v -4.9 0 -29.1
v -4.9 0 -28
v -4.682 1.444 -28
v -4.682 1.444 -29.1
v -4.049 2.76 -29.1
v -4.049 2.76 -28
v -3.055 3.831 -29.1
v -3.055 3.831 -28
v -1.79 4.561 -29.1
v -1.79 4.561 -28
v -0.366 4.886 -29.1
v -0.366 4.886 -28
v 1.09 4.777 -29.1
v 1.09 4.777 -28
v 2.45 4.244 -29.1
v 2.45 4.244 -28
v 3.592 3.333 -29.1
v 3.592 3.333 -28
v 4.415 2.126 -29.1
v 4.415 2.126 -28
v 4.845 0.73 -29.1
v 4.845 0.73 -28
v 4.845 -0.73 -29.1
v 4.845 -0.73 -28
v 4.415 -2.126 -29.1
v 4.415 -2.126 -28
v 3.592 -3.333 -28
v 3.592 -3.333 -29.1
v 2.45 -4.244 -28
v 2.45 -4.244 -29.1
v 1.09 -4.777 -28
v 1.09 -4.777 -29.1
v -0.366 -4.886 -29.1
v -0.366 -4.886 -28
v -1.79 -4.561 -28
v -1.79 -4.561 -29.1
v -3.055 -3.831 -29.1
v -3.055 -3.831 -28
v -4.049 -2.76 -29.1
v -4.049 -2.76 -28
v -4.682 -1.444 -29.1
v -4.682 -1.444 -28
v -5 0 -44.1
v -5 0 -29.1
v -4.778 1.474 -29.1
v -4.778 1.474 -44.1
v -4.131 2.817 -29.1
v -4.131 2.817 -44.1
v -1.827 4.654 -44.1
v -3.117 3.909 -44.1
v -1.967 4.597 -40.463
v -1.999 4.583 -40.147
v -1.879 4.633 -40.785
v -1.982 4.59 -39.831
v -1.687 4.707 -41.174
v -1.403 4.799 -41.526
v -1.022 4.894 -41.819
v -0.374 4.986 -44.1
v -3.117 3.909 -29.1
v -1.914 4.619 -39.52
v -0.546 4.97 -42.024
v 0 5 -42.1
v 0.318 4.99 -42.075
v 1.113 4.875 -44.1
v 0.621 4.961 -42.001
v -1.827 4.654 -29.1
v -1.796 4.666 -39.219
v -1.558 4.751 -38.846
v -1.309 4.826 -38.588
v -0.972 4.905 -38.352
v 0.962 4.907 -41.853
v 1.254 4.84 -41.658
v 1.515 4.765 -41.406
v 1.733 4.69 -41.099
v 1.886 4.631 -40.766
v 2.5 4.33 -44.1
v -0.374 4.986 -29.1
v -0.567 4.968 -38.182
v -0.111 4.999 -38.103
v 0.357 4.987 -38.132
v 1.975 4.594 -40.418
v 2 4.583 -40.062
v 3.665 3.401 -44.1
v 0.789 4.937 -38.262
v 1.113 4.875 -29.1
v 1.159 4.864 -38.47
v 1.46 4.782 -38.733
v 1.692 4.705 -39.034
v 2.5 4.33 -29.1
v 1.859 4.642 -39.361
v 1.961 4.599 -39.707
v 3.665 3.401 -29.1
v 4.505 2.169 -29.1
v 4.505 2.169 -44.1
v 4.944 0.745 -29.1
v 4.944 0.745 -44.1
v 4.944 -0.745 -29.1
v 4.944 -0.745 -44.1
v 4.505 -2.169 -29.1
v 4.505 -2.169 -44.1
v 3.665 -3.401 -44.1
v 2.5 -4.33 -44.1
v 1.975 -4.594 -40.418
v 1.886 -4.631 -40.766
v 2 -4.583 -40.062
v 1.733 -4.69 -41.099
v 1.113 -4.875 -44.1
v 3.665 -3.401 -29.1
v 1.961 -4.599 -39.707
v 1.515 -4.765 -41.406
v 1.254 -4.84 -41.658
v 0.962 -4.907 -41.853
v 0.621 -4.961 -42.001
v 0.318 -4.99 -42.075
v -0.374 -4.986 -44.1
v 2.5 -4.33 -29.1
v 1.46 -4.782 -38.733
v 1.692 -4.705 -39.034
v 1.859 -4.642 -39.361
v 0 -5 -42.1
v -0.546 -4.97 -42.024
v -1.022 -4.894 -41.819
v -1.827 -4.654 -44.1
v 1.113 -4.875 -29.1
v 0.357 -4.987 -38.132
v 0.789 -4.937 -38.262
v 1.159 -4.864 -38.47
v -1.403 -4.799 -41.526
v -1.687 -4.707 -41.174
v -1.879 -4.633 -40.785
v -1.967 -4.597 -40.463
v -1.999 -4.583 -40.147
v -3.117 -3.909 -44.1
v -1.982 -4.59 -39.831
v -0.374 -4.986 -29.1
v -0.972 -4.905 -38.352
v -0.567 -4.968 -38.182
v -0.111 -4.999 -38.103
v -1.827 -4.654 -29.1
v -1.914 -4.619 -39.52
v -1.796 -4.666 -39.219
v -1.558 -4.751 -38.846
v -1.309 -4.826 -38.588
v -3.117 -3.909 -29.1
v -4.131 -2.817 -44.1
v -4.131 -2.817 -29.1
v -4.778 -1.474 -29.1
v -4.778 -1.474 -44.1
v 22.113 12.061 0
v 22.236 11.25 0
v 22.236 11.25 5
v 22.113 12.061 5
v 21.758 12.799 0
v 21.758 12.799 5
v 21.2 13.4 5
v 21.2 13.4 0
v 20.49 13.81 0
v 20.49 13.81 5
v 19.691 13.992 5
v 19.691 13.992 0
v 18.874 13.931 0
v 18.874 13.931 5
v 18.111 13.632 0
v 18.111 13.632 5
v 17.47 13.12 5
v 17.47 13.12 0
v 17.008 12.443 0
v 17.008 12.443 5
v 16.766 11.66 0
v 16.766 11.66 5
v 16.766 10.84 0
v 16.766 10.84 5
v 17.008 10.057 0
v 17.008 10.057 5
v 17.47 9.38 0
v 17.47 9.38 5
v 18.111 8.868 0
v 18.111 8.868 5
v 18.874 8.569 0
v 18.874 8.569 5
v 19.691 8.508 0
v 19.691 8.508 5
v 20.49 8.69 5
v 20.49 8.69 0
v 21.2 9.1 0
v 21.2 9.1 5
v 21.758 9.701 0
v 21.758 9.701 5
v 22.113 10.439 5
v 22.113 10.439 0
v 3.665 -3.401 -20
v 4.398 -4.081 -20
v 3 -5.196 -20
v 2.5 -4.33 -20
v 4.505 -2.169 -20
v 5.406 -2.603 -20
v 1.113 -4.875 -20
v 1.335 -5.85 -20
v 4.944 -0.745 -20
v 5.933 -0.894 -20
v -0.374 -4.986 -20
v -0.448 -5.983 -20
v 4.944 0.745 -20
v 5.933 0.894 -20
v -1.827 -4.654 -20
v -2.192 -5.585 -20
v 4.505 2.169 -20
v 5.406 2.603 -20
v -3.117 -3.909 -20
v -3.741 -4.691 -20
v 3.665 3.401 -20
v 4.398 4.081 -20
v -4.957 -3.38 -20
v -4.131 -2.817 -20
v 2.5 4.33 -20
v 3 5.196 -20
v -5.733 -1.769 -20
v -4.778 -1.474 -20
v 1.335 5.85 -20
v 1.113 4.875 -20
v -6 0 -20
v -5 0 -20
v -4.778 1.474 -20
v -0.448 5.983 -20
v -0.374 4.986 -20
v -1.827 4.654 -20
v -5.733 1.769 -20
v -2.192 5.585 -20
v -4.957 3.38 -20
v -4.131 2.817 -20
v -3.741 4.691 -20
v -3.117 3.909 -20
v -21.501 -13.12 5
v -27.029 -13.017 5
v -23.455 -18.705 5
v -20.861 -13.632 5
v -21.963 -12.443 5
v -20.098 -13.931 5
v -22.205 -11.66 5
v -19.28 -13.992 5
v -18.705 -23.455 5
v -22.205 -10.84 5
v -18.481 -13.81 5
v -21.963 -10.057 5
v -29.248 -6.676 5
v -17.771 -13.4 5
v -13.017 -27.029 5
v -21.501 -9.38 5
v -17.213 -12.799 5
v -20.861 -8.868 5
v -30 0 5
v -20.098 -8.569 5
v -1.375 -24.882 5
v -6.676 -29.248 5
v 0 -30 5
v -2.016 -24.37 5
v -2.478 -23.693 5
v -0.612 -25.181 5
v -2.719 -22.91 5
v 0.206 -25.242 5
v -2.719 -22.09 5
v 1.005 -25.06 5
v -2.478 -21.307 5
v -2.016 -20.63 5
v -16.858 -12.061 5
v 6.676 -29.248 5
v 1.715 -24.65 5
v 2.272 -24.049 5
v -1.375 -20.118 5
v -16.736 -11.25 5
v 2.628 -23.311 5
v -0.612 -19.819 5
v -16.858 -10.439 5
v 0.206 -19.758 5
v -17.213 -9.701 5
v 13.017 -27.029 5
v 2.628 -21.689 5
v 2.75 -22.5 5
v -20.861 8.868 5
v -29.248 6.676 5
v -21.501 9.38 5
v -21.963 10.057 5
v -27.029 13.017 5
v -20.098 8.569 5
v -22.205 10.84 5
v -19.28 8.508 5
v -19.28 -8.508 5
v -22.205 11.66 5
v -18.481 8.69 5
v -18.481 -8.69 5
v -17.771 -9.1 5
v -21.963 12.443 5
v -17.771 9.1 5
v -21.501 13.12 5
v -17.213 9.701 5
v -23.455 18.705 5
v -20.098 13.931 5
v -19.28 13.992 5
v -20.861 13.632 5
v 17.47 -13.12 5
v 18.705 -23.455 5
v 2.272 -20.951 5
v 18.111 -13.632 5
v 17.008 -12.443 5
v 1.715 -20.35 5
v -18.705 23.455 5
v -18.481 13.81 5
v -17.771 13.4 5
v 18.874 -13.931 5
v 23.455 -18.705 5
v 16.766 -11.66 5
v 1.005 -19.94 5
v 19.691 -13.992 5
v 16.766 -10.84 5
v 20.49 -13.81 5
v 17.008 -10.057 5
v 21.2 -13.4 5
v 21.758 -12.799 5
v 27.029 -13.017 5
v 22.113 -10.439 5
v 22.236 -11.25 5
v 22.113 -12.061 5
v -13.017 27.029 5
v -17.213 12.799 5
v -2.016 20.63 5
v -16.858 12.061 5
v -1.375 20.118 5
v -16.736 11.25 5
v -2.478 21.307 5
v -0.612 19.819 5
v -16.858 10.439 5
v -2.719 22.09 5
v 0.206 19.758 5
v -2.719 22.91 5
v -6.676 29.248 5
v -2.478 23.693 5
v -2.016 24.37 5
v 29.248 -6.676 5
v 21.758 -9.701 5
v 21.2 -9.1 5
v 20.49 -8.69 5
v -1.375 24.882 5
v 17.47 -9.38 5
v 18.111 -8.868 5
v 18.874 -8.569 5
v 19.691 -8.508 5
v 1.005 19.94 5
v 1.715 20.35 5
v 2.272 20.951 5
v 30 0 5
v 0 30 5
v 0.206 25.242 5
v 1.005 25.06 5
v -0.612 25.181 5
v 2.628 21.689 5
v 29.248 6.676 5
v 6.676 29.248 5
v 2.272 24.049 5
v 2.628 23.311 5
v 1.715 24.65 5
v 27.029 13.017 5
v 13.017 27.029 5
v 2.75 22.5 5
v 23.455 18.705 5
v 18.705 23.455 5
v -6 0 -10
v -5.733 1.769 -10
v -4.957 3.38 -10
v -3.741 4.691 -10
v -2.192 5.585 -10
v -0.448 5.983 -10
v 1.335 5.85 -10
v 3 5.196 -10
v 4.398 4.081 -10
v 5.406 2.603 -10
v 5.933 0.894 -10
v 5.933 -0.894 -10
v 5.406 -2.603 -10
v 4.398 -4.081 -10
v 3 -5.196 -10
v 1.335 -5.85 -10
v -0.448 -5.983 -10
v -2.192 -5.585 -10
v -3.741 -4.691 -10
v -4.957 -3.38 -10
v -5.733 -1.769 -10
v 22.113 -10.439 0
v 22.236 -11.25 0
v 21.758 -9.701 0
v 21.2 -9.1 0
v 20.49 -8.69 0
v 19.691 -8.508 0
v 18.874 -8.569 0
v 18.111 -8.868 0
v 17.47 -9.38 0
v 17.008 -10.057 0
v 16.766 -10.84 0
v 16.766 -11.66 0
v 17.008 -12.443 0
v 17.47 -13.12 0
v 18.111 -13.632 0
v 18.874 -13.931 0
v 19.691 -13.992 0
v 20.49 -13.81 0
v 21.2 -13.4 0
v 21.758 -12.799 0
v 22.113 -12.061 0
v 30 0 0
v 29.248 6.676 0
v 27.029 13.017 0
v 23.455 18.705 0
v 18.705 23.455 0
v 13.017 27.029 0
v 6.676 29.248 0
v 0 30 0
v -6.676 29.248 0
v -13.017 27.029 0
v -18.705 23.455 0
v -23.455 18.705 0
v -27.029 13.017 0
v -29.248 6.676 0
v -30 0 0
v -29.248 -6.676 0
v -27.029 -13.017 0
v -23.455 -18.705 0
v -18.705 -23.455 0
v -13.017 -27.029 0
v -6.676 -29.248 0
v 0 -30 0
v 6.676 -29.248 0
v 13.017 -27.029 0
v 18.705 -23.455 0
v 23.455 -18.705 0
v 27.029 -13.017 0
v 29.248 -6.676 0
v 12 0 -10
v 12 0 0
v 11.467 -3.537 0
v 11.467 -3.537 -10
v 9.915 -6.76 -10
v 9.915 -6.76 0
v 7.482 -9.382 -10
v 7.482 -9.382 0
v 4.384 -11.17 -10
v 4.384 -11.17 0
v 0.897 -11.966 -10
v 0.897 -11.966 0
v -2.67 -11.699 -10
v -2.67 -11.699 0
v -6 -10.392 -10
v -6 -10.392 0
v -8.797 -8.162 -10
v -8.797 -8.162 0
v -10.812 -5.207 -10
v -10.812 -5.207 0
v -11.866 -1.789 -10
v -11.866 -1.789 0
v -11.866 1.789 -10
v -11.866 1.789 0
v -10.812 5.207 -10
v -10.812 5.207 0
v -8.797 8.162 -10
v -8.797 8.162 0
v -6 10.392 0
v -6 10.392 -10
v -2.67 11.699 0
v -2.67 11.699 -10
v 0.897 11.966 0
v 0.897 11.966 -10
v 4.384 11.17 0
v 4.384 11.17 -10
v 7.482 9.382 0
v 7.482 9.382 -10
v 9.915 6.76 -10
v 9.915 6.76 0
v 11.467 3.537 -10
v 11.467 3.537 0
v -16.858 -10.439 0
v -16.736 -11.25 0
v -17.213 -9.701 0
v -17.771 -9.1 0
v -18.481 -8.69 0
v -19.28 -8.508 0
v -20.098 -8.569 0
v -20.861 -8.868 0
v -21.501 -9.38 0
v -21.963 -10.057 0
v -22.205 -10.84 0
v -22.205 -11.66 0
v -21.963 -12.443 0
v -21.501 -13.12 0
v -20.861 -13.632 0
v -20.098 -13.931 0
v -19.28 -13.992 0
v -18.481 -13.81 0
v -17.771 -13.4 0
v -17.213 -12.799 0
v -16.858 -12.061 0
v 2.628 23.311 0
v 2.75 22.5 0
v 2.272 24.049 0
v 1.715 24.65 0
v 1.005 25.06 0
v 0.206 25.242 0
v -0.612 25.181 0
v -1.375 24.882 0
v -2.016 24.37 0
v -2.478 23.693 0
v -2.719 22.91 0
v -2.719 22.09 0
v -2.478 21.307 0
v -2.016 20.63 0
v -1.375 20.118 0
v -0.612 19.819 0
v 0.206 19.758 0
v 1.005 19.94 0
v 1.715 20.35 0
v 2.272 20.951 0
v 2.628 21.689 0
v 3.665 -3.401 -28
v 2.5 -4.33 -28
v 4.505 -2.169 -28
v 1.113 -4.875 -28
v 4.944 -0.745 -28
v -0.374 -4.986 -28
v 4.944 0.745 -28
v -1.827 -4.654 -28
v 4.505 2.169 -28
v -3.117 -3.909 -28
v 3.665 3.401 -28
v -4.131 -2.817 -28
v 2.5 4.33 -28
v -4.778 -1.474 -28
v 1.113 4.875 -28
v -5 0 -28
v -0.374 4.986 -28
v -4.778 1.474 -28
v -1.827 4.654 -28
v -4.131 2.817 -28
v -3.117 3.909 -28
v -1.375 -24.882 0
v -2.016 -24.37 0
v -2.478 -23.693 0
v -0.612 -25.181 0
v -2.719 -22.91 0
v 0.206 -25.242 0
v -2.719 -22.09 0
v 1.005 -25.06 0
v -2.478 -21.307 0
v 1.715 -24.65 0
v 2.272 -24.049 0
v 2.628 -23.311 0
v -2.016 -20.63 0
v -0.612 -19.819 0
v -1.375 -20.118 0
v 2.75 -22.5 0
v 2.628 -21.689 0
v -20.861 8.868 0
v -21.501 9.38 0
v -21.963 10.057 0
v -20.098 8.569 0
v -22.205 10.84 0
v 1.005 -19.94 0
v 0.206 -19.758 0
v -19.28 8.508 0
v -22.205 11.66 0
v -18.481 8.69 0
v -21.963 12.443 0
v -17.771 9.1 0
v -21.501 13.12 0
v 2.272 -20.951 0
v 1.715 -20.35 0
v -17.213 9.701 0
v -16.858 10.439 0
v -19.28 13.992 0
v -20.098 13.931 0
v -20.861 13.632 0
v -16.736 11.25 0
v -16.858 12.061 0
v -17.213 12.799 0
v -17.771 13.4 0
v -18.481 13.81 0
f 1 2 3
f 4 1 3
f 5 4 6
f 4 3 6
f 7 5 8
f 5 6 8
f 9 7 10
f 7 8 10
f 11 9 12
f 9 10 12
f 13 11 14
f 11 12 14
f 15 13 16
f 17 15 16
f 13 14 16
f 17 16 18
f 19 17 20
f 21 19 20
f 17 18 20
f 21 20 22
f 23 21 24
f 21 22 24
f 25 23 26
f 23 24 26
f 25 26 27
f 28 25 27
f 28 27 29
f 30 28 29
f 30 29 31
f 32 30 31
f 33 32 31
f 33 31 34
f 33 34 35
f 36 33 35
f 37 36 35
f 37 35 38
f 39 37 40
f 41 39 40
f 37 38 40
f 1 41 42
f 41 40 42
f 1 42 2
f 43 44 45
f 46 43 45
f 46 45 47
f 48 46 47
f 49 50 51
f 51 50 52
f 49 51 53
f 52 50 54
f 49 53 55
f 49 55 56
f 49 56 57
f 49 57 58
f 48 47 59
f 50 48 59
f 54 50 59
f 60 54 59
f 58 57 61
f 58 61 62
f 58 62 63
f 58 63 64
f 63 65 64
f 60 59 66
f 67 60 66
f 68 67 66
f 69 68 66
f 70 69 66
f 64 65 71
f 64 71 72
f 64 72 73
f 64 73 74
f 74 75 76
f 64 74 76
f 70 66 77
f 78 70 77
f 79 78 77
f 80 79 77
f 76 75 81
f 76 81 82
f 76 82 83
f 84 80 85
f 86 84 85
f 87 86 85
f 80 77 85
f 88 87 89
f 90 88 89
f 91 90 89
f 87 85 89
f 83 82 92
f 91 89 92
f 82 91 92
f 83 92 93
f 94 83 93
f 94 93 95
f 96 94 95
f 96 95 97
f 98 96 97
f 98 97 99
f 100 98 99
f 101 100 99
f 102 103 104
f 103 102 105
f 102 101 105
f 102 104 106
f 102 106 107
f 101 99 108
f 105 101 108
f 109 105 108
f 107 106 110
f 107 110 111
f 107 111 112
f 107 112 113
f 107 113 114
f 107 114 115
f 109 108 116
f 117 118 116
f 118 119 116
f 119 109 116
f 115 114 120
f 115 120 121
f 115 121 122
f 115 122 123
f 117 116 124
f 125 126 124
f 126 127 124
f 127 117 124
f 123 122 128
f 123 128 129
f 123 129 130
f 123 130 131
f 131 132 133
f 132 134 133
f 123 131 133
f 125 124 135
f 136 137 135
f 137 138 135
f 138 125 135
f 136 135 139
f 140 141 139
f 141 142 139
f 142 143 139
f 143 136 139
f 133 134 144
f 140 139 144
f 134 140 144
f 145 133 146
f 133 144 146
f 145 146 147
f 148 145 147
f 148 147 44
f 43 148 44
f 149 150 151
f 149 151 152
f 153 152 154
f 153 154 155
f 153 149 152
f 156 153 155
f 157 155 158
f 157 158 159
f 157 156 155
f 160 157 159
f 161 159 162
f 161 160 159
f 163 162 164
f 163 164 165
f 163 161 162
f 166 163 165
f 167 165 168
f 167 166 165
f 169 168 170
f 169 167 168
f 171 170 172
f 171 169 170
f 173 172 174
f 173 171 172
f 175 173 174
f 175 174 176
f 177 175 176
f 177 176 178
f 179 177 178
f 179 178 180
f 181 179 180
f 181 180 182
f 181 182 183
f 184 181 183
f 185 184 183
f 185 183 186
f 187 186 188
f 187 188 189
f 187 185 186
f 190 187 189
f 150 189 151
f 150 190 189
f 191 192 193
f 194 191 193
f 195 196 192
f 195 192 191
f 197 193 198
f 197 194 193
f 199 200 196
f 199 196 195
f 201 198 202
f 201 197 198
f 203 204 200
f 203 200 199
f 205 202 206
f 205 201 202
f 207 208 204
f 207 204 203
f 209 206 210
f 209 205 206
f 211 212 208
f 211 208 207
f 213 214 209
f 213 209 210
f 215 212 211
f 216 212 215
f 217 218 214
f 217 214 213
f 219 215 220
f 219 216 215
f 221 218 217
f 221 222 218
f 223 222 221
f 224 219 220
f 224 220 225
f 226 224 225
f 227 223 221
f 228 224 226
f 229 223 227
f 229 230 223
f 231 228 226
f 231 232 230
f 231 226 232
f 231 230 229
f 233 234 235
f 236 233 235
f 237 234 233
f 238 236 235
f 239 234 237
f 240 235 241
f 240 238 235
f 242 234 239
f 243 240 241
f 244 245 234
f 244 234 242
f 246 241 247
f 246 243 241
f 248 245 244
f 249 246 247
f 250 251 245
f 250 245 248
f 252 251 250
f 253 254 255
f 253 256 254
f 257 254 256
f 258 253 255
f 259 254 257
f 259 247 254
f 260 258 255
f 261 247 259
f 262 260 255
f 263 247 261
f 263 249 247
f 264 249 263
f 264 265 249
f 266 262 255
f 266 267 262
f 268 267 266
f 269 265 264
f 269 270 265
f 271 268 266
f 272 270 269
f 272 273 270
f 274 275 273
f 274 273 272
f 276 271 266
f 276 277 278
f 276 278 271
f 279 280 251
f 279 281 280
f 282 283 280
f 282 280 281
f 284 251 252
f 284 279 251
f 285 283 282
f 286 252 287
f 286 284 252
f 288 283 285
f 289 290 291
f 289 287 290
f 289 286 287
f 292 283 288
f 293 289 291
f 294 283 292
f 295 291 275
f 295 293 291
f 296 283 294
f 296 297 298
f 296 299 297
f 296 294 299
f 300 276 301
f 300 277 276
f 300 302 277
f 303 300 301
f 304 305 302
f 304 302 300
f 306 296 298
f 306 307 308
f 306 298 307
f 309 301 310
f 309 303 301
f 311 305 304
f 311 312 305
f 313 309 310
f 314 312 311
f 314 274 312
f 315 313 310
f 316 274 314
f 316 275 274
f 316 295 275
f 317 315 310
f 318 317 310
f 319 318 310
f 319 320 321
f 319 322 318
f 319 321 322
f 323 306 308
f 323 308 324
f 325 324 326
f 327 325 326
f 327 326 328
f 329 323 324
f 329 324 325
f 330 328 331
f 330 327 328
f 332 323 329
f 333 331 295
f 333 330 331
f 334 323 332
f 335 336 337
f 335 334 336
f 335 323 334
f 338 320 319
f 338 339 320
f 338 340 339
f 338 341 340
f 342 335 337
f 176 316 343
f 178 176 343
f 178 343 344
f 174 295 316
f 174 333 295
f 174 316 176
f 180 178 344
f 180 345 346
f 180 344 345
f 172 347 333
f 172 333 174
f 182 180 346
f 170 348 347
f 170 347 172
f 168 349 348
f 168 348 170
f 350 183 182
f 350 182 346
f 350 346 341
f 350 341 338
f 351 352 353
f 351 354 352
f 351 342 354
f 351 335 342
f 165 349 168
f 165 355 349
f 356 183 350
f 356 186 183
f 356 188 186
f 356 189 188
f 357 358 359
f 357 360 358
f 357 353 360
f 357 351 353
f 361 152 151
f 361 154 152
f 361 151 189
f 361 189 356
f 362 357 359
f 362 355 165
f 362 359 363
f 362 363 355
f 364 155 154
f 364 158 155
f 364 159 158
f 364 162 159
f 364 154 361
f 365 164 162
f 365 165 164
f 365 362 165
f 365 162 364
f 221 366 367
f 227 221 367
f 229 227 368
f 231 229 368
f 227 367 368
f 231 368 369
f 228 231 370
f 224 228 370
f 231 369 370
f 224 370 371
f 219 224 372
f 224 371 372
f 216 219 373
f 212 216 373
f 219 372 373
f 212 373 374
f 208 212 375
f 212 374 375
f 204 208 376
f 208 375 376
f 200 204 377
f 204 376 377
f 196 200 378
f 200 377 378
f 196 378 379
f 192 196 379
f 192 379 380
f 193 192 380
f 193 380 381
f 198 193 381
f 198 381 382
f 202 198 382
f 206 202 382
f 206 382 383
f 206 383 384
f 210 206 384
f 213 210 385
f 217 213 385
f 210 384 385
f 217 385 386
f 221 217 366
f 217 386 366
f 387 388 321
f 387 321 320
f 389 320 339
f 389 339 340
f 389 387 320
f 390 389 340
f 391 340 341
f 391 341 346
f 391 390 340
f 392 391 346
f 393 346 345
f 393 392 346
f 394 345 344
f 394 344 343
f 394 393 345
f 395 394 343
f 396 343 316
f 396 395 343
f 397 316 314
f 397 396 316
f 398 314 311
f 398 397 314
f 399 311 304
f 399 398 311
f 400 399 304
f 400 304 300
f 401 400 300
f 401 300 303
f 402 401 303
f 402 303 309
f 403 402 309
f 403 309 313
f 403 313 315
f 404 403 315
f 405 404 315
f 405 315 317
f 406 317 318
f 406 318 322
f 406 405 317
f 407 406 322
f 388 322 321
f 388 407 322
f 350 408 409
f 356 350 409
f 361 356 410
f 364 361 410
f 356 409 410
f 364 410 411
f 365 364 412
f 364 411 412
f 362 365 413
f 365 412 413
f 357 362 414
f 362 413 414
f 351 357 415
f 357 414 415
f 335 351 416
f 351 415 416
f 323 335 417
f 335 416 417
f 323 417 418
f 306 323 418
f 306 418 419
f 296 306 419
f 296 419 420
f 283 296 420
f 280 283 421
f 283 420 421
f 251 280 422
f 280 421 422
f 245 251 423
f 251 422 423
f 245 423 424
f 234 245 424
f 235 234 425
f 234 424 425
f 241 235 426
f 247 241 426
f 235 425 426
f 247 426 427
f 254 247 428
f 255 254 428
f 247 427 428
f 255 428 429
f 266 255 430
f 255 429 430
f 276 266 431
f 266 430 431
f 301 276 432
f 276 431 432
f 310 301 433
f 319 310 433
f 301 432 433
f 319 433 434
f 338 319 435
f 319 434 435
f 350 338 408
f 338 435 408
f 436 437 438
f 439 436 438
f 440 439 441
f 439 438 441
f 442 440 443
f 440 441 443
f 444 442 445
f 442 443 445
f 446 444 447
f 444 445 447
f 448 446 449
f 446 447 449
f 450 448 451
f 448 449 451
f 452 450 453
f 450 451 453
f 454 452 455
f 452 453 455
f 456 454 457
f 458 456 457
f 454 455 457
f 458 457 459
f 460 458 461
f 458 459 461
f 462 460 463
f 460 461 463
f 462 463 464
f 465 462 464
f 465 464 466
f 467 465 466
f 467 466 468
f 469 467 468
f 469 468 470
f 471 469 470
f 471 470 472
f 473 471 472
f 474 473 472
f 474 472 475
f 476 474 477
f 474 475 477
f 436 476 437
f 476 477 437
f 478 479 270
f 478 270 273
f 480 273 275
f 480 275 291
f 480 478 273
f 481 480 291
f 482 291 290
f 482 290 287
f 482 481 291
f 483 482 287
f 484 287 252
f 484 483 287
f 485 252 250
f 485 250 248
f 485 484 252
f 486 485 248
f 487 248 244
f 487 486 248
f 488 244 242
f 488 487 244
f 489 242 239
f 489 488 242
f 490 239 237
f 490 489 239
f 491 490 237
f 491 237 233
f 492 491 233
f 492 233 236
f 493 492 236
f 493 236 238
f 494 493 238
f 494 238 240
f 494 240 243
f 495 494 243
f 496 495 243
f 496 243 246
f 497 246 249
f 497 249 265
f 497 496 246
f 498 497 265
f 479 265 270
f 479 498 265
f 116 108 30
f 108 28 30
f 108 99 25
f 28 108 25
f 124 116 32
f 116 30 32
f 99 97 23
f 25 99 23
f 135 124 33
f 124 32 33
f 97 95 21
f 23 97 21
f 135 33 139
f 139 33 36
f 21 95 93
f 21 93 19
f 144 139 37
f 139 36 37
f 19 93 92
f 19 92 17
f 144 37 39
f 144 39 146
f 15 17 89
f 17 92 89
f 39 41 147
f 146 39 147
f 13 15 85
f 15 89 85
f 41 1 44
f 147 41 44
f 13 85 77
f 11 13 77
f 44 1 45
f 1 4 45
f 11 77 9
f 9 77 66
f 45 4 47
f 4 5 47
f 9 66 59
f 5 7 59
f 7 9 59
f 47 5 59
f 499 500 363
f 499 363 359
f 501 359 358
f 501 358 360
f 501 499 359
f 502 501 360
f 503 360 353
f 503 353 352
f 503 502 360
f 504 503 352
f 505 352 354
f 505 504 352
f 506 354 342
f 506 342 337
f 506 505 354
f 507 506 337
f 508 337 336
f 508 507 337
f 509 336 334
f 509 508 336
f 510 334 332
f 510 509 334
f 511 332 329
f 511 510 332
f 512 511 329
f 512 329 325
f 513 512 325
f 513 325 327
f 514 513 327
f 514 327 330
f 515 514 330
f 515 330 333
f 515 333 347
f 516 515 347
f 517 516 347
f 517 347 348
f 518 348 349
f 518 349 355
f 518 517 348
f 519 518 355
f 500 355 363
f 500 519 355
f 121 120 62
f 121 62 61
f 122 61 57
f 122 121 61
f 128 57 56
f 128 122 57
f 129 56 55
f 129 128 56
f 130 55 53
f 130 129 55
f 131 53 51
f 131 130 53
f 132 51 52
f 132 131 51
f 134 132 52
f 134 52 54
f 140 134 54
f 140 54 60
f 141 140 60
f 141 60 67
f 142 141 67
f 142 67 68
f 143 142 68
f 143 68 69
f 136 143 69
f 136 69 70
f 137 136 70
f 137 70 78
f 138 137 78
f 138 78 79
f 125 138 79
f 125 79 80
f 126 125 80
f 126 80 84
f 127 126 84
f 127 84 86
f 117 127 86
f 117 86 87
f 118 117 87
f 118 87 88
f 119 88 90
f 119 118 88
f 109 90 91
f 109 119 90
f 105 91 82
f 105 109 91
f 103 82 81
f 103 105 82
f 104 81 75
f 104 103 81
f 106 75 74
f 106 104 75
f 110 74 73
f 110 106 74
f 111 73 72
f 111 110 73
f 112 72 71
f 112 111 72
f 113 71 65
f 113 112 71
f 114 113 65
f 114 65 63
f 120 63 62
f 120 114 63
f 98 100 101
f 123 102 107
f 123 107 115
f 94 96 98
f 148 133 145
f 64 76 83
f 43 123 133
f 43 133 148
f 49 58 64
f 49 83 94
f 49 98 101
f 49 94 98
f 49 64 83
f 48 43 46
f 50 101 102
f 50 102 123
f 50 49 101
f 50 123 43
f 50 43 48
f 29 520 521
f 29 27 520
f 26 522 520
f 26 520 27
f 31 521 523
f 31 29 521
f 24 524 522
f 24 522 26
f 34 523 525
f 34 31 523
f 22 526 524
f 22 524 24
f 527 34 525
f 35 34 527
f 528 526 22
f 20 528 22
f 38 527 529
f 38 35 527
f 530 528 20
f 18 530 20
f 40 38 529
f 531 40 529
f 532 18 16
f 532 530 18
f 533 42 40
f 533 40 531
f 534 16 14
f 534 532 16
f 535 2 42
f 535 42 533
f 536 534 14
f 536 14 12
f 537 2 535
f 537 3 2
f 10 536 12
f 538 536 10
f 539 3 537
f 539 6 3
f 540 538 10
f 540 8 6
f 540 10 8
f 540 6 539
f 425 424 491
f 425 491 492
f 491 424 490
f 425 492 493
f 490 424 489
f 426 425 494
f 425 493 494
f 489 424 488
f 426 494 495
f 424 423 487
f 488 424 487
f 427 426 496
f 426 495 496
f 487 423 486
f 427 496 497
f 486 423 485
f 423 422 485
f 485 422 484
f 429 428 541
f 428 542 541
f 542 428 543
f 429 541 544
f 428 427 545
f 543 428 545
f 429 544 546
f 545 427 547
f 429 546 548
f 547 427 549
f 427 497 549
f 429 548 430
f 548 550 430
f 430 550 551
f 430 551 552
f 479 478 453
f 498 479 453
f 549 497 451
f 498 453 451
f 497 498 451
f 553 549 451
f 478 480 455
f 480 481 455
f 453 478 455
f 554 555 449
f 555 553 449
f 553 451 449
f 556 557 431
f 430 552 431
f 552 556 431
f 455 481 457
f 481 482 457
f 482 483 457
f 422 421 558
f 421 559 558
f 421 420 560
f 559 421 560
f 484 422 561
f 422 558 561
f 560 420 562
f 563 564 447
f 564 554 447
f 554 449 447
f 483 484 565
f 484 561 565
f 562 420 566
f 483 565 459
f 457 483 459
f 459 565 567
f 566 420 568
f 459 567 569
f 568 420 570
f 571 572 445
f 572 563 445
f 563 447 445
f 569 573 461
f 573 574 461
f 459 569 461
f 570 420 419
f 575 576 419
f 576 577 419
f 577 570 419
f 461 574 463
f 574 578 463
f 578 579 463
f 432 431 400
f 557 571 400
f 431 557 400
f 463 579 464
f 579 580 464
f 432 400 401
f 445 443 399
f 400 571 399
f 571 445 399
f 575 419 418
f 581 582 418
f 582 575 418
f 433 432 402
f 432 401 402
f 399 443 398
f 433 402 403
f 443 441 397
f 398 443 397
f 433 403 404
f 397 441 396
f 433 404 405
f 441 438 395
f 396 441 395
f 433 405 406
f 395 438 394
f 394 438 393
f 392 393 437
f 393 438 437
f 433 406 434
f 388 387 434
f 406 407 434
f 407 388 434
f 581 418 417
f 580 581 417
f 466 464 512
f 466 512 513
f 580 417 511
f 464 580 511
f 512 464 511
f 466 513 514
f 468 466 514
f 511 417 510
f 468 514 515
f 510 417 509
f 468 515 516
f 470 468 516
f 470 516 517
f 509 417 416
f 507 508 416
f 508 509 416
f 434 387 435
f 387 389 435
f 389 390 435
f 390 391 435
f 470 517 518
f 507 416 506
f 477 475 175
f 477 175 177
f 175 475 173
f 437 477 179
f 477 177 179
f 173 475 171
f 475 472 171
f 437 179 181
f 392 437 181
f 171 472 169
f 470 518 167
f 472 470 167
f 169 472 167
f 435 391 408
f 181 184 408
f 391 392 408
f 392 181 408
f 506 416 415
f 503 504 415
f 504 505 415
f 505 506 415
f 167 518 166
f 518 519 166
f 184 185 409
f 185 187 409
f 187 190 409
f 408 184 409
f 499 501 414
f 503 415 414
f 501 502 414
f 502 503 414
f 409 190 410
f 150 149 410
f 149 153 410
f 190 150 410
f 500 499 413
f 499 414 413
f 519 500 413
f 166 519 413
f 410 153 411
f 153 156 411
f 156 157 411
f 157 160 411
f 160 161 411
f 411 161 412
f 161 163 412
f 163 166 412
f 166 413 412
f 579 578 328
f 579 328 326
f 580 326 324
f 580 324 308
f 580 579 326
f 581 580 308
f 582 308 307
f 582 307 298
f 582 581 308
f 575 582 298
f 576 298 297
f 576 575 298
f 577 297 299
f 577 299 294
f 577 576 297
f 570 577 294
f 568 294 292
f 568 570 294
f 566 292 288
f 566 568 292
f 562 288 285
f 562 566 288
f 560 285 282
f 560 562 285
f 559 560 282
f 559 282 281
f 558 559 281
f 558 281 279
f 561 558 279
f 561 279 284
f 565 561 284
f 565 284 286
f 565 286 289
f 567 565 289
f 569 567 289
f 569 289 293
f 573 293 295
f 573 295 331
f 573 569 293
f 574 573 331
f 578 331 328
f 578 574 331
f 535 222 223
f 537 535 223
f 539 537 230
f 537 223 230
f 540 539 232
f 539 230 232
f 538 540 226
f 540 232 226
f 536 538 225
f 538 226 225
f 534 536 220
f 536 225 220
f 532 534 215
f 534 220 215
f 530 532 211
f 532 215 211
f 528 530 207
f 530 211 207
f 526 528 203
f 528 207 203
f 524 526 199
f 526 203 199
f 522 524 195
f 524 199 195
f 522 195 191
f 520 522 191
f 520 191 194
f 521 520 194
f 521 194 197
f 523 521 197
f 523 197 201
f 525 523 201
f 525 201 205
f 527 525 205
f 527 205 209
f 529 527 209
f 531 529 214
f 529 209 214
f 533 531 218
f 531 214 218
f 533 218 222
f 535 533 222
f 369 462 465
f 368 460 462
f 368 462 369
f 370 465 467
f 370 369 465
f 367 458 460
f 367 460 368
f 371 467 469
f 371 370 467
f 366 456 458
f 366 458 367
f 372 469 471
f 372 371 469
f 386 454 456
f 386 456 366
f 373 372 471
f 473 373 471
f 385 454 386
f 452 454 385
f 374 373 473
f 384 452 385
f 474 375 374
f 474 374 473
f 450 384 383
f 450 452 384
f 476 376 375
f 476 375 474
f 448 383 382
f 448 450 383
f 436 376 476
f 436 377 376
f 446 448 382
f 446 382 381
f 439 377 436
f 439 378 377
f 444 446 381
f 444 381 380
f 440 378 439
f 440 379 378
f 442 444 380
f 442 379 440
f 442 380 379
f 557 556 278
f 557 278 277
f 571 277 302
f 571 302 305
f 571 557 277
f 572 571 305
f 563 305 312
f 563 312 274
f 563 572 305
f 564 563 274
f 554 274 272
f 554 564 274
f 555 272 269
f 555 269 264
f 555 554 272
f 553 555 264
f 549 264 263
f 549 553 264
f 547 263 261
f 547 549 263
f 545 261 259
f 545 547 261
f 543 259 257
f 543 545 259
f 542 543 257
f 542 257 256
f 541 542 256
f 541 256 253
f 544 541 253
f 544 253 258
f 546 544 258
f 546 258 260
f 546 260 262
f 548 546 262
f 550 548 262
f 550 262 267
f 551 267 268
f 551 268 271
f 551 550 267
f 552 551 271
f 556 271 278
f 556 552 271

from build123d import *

# Parameters (mm, degrees)
SKETCH_1_R               = 30
SKETCH_1_R_2             = 2.75
EXTRUDE_1_DEPTH          = 5
SKETCH_2_R               = 12
EXTRUDE_2_DEPTH          = 10
SKETCH_3_R               = 6
EXTRUDE_3_DEPTH          = 10
SKETCH_4_R               = 5
EXTRUDE_4_DEPTH          = 8
SKETCH_5_R               = 4.9
EXTRUDE_5_DEPTH          = 1.1
SKETCH_6_R               = 5
EXTRUDE_6_DEPTH          = 15
CUT_EXTRUDE_1_DEPTH      = 15
CUT_EXTRUDE_1_DEPTH_BACK = 15
SKETCH_7_R               = 2


with BuildPart() as part:
    # 草图1 → 凸台-拉伸1 (new body)
    with BuildSketch(Plane.XY):
        Circle(SKETCH_1_R)
        with Locations((0, 22.5)):
            Circle(SKETCH_1_R_2, mode=Mode.SUBTRACT)
        with Locations((19.485571585, 11.25)):
            Circle(SKETCH_1_R_2, mode=Mode.SUBTRACT)
        with Locations((19.485571585, -11.25)):
            Circle(SKETCH_1_R_2, mode=Mode.SUBTRACT)
        with Locations((0, -22.5)):
            Circle(SKETCH_1_R_2, mode=Mode.SUBTRACT)
        with Locations((-19.485571585, -11.25)):
            Circle(SKETCH_1_R_2, mode=Mode.SUBTRACT)
        with Locations((-19.485571585, 11.25)):
            Circle(SKETCH_1_R_2, mode=Mode.SUBTRACT)
    extrude(amount=EXTRUDE_1_DEPTH)

    # 草图2 → 凸台-拉伸2 (add)
    with BuildSketch(Plane(origin=(0, 0, 0), x_dir=(-1, 0, 0), z_dir=(0, 0, -1))):
        Circle(SKETCH_2_R)
    extrude(amount=EXTRUDE_2_DEPTH)

    # 草图3 → 凸台-拉伸3 (add)
    with BuildSketch(Plane(origin=(0, 0, -10), x_dir=(-1, 0, 0), z_dir=(0, 0, -1))):
        Circle(SKETCH_3_R)
    extrude(amount=EXTRUDE_3_DEPTH)

    # 草图4 → 凸台-拉伸4 (add)
    with BuildSketch(Plane(origin=(0, 0, -20), x_dir=(-1, 0, 0), z_dir=(0, 0, -1))):
        Circle(SKETCH_4_R)
    extrude(amount=EXTRUDE_4_DEPTH)

    # 草图5 → 凸台-拉伸5 (add)
    with BuildSketch(Plane(origin=(0, 0, -28), x_dir=(-1, 0, 0), z_dir=(0, 0, -1))):
        Circle(SKETCH_5_R)
    extrude(amount=EXTRUDE_5_DEPTH)

    # 草图6 → 凸台-拉伸6 (add)
    with BuildSketch(Plane(origin=(0, 0, -29.1), x_dir=(-1, 0, 0), z_dir=(0, 0, -1))):
        Circle(SKETCH_6_R)
    extrude(amount=EXTRUDE_6_DEPTH)

    # 草图7 → 切除-拉伸1 (cut, two sides: drawn at the far end of the back side and taken through both)
    with BuildSketch(Plane(origin=(0, 0, 0), x_dir=(1, 0, 0), z_dir=(0, 1, 0)).offset(-CUT_EXTRUDE_1_DEPTH_BACK)):
        with Locations((0, 40.1)):
            Circle(SKETCH_7_R)
    extrude(amount=CUT_EXTRUDE_1_DEPTH + CUT_EXTRUDE_1_DEPTH_BACK, mode=Mode.SUBTRACT)


solid = part.part
